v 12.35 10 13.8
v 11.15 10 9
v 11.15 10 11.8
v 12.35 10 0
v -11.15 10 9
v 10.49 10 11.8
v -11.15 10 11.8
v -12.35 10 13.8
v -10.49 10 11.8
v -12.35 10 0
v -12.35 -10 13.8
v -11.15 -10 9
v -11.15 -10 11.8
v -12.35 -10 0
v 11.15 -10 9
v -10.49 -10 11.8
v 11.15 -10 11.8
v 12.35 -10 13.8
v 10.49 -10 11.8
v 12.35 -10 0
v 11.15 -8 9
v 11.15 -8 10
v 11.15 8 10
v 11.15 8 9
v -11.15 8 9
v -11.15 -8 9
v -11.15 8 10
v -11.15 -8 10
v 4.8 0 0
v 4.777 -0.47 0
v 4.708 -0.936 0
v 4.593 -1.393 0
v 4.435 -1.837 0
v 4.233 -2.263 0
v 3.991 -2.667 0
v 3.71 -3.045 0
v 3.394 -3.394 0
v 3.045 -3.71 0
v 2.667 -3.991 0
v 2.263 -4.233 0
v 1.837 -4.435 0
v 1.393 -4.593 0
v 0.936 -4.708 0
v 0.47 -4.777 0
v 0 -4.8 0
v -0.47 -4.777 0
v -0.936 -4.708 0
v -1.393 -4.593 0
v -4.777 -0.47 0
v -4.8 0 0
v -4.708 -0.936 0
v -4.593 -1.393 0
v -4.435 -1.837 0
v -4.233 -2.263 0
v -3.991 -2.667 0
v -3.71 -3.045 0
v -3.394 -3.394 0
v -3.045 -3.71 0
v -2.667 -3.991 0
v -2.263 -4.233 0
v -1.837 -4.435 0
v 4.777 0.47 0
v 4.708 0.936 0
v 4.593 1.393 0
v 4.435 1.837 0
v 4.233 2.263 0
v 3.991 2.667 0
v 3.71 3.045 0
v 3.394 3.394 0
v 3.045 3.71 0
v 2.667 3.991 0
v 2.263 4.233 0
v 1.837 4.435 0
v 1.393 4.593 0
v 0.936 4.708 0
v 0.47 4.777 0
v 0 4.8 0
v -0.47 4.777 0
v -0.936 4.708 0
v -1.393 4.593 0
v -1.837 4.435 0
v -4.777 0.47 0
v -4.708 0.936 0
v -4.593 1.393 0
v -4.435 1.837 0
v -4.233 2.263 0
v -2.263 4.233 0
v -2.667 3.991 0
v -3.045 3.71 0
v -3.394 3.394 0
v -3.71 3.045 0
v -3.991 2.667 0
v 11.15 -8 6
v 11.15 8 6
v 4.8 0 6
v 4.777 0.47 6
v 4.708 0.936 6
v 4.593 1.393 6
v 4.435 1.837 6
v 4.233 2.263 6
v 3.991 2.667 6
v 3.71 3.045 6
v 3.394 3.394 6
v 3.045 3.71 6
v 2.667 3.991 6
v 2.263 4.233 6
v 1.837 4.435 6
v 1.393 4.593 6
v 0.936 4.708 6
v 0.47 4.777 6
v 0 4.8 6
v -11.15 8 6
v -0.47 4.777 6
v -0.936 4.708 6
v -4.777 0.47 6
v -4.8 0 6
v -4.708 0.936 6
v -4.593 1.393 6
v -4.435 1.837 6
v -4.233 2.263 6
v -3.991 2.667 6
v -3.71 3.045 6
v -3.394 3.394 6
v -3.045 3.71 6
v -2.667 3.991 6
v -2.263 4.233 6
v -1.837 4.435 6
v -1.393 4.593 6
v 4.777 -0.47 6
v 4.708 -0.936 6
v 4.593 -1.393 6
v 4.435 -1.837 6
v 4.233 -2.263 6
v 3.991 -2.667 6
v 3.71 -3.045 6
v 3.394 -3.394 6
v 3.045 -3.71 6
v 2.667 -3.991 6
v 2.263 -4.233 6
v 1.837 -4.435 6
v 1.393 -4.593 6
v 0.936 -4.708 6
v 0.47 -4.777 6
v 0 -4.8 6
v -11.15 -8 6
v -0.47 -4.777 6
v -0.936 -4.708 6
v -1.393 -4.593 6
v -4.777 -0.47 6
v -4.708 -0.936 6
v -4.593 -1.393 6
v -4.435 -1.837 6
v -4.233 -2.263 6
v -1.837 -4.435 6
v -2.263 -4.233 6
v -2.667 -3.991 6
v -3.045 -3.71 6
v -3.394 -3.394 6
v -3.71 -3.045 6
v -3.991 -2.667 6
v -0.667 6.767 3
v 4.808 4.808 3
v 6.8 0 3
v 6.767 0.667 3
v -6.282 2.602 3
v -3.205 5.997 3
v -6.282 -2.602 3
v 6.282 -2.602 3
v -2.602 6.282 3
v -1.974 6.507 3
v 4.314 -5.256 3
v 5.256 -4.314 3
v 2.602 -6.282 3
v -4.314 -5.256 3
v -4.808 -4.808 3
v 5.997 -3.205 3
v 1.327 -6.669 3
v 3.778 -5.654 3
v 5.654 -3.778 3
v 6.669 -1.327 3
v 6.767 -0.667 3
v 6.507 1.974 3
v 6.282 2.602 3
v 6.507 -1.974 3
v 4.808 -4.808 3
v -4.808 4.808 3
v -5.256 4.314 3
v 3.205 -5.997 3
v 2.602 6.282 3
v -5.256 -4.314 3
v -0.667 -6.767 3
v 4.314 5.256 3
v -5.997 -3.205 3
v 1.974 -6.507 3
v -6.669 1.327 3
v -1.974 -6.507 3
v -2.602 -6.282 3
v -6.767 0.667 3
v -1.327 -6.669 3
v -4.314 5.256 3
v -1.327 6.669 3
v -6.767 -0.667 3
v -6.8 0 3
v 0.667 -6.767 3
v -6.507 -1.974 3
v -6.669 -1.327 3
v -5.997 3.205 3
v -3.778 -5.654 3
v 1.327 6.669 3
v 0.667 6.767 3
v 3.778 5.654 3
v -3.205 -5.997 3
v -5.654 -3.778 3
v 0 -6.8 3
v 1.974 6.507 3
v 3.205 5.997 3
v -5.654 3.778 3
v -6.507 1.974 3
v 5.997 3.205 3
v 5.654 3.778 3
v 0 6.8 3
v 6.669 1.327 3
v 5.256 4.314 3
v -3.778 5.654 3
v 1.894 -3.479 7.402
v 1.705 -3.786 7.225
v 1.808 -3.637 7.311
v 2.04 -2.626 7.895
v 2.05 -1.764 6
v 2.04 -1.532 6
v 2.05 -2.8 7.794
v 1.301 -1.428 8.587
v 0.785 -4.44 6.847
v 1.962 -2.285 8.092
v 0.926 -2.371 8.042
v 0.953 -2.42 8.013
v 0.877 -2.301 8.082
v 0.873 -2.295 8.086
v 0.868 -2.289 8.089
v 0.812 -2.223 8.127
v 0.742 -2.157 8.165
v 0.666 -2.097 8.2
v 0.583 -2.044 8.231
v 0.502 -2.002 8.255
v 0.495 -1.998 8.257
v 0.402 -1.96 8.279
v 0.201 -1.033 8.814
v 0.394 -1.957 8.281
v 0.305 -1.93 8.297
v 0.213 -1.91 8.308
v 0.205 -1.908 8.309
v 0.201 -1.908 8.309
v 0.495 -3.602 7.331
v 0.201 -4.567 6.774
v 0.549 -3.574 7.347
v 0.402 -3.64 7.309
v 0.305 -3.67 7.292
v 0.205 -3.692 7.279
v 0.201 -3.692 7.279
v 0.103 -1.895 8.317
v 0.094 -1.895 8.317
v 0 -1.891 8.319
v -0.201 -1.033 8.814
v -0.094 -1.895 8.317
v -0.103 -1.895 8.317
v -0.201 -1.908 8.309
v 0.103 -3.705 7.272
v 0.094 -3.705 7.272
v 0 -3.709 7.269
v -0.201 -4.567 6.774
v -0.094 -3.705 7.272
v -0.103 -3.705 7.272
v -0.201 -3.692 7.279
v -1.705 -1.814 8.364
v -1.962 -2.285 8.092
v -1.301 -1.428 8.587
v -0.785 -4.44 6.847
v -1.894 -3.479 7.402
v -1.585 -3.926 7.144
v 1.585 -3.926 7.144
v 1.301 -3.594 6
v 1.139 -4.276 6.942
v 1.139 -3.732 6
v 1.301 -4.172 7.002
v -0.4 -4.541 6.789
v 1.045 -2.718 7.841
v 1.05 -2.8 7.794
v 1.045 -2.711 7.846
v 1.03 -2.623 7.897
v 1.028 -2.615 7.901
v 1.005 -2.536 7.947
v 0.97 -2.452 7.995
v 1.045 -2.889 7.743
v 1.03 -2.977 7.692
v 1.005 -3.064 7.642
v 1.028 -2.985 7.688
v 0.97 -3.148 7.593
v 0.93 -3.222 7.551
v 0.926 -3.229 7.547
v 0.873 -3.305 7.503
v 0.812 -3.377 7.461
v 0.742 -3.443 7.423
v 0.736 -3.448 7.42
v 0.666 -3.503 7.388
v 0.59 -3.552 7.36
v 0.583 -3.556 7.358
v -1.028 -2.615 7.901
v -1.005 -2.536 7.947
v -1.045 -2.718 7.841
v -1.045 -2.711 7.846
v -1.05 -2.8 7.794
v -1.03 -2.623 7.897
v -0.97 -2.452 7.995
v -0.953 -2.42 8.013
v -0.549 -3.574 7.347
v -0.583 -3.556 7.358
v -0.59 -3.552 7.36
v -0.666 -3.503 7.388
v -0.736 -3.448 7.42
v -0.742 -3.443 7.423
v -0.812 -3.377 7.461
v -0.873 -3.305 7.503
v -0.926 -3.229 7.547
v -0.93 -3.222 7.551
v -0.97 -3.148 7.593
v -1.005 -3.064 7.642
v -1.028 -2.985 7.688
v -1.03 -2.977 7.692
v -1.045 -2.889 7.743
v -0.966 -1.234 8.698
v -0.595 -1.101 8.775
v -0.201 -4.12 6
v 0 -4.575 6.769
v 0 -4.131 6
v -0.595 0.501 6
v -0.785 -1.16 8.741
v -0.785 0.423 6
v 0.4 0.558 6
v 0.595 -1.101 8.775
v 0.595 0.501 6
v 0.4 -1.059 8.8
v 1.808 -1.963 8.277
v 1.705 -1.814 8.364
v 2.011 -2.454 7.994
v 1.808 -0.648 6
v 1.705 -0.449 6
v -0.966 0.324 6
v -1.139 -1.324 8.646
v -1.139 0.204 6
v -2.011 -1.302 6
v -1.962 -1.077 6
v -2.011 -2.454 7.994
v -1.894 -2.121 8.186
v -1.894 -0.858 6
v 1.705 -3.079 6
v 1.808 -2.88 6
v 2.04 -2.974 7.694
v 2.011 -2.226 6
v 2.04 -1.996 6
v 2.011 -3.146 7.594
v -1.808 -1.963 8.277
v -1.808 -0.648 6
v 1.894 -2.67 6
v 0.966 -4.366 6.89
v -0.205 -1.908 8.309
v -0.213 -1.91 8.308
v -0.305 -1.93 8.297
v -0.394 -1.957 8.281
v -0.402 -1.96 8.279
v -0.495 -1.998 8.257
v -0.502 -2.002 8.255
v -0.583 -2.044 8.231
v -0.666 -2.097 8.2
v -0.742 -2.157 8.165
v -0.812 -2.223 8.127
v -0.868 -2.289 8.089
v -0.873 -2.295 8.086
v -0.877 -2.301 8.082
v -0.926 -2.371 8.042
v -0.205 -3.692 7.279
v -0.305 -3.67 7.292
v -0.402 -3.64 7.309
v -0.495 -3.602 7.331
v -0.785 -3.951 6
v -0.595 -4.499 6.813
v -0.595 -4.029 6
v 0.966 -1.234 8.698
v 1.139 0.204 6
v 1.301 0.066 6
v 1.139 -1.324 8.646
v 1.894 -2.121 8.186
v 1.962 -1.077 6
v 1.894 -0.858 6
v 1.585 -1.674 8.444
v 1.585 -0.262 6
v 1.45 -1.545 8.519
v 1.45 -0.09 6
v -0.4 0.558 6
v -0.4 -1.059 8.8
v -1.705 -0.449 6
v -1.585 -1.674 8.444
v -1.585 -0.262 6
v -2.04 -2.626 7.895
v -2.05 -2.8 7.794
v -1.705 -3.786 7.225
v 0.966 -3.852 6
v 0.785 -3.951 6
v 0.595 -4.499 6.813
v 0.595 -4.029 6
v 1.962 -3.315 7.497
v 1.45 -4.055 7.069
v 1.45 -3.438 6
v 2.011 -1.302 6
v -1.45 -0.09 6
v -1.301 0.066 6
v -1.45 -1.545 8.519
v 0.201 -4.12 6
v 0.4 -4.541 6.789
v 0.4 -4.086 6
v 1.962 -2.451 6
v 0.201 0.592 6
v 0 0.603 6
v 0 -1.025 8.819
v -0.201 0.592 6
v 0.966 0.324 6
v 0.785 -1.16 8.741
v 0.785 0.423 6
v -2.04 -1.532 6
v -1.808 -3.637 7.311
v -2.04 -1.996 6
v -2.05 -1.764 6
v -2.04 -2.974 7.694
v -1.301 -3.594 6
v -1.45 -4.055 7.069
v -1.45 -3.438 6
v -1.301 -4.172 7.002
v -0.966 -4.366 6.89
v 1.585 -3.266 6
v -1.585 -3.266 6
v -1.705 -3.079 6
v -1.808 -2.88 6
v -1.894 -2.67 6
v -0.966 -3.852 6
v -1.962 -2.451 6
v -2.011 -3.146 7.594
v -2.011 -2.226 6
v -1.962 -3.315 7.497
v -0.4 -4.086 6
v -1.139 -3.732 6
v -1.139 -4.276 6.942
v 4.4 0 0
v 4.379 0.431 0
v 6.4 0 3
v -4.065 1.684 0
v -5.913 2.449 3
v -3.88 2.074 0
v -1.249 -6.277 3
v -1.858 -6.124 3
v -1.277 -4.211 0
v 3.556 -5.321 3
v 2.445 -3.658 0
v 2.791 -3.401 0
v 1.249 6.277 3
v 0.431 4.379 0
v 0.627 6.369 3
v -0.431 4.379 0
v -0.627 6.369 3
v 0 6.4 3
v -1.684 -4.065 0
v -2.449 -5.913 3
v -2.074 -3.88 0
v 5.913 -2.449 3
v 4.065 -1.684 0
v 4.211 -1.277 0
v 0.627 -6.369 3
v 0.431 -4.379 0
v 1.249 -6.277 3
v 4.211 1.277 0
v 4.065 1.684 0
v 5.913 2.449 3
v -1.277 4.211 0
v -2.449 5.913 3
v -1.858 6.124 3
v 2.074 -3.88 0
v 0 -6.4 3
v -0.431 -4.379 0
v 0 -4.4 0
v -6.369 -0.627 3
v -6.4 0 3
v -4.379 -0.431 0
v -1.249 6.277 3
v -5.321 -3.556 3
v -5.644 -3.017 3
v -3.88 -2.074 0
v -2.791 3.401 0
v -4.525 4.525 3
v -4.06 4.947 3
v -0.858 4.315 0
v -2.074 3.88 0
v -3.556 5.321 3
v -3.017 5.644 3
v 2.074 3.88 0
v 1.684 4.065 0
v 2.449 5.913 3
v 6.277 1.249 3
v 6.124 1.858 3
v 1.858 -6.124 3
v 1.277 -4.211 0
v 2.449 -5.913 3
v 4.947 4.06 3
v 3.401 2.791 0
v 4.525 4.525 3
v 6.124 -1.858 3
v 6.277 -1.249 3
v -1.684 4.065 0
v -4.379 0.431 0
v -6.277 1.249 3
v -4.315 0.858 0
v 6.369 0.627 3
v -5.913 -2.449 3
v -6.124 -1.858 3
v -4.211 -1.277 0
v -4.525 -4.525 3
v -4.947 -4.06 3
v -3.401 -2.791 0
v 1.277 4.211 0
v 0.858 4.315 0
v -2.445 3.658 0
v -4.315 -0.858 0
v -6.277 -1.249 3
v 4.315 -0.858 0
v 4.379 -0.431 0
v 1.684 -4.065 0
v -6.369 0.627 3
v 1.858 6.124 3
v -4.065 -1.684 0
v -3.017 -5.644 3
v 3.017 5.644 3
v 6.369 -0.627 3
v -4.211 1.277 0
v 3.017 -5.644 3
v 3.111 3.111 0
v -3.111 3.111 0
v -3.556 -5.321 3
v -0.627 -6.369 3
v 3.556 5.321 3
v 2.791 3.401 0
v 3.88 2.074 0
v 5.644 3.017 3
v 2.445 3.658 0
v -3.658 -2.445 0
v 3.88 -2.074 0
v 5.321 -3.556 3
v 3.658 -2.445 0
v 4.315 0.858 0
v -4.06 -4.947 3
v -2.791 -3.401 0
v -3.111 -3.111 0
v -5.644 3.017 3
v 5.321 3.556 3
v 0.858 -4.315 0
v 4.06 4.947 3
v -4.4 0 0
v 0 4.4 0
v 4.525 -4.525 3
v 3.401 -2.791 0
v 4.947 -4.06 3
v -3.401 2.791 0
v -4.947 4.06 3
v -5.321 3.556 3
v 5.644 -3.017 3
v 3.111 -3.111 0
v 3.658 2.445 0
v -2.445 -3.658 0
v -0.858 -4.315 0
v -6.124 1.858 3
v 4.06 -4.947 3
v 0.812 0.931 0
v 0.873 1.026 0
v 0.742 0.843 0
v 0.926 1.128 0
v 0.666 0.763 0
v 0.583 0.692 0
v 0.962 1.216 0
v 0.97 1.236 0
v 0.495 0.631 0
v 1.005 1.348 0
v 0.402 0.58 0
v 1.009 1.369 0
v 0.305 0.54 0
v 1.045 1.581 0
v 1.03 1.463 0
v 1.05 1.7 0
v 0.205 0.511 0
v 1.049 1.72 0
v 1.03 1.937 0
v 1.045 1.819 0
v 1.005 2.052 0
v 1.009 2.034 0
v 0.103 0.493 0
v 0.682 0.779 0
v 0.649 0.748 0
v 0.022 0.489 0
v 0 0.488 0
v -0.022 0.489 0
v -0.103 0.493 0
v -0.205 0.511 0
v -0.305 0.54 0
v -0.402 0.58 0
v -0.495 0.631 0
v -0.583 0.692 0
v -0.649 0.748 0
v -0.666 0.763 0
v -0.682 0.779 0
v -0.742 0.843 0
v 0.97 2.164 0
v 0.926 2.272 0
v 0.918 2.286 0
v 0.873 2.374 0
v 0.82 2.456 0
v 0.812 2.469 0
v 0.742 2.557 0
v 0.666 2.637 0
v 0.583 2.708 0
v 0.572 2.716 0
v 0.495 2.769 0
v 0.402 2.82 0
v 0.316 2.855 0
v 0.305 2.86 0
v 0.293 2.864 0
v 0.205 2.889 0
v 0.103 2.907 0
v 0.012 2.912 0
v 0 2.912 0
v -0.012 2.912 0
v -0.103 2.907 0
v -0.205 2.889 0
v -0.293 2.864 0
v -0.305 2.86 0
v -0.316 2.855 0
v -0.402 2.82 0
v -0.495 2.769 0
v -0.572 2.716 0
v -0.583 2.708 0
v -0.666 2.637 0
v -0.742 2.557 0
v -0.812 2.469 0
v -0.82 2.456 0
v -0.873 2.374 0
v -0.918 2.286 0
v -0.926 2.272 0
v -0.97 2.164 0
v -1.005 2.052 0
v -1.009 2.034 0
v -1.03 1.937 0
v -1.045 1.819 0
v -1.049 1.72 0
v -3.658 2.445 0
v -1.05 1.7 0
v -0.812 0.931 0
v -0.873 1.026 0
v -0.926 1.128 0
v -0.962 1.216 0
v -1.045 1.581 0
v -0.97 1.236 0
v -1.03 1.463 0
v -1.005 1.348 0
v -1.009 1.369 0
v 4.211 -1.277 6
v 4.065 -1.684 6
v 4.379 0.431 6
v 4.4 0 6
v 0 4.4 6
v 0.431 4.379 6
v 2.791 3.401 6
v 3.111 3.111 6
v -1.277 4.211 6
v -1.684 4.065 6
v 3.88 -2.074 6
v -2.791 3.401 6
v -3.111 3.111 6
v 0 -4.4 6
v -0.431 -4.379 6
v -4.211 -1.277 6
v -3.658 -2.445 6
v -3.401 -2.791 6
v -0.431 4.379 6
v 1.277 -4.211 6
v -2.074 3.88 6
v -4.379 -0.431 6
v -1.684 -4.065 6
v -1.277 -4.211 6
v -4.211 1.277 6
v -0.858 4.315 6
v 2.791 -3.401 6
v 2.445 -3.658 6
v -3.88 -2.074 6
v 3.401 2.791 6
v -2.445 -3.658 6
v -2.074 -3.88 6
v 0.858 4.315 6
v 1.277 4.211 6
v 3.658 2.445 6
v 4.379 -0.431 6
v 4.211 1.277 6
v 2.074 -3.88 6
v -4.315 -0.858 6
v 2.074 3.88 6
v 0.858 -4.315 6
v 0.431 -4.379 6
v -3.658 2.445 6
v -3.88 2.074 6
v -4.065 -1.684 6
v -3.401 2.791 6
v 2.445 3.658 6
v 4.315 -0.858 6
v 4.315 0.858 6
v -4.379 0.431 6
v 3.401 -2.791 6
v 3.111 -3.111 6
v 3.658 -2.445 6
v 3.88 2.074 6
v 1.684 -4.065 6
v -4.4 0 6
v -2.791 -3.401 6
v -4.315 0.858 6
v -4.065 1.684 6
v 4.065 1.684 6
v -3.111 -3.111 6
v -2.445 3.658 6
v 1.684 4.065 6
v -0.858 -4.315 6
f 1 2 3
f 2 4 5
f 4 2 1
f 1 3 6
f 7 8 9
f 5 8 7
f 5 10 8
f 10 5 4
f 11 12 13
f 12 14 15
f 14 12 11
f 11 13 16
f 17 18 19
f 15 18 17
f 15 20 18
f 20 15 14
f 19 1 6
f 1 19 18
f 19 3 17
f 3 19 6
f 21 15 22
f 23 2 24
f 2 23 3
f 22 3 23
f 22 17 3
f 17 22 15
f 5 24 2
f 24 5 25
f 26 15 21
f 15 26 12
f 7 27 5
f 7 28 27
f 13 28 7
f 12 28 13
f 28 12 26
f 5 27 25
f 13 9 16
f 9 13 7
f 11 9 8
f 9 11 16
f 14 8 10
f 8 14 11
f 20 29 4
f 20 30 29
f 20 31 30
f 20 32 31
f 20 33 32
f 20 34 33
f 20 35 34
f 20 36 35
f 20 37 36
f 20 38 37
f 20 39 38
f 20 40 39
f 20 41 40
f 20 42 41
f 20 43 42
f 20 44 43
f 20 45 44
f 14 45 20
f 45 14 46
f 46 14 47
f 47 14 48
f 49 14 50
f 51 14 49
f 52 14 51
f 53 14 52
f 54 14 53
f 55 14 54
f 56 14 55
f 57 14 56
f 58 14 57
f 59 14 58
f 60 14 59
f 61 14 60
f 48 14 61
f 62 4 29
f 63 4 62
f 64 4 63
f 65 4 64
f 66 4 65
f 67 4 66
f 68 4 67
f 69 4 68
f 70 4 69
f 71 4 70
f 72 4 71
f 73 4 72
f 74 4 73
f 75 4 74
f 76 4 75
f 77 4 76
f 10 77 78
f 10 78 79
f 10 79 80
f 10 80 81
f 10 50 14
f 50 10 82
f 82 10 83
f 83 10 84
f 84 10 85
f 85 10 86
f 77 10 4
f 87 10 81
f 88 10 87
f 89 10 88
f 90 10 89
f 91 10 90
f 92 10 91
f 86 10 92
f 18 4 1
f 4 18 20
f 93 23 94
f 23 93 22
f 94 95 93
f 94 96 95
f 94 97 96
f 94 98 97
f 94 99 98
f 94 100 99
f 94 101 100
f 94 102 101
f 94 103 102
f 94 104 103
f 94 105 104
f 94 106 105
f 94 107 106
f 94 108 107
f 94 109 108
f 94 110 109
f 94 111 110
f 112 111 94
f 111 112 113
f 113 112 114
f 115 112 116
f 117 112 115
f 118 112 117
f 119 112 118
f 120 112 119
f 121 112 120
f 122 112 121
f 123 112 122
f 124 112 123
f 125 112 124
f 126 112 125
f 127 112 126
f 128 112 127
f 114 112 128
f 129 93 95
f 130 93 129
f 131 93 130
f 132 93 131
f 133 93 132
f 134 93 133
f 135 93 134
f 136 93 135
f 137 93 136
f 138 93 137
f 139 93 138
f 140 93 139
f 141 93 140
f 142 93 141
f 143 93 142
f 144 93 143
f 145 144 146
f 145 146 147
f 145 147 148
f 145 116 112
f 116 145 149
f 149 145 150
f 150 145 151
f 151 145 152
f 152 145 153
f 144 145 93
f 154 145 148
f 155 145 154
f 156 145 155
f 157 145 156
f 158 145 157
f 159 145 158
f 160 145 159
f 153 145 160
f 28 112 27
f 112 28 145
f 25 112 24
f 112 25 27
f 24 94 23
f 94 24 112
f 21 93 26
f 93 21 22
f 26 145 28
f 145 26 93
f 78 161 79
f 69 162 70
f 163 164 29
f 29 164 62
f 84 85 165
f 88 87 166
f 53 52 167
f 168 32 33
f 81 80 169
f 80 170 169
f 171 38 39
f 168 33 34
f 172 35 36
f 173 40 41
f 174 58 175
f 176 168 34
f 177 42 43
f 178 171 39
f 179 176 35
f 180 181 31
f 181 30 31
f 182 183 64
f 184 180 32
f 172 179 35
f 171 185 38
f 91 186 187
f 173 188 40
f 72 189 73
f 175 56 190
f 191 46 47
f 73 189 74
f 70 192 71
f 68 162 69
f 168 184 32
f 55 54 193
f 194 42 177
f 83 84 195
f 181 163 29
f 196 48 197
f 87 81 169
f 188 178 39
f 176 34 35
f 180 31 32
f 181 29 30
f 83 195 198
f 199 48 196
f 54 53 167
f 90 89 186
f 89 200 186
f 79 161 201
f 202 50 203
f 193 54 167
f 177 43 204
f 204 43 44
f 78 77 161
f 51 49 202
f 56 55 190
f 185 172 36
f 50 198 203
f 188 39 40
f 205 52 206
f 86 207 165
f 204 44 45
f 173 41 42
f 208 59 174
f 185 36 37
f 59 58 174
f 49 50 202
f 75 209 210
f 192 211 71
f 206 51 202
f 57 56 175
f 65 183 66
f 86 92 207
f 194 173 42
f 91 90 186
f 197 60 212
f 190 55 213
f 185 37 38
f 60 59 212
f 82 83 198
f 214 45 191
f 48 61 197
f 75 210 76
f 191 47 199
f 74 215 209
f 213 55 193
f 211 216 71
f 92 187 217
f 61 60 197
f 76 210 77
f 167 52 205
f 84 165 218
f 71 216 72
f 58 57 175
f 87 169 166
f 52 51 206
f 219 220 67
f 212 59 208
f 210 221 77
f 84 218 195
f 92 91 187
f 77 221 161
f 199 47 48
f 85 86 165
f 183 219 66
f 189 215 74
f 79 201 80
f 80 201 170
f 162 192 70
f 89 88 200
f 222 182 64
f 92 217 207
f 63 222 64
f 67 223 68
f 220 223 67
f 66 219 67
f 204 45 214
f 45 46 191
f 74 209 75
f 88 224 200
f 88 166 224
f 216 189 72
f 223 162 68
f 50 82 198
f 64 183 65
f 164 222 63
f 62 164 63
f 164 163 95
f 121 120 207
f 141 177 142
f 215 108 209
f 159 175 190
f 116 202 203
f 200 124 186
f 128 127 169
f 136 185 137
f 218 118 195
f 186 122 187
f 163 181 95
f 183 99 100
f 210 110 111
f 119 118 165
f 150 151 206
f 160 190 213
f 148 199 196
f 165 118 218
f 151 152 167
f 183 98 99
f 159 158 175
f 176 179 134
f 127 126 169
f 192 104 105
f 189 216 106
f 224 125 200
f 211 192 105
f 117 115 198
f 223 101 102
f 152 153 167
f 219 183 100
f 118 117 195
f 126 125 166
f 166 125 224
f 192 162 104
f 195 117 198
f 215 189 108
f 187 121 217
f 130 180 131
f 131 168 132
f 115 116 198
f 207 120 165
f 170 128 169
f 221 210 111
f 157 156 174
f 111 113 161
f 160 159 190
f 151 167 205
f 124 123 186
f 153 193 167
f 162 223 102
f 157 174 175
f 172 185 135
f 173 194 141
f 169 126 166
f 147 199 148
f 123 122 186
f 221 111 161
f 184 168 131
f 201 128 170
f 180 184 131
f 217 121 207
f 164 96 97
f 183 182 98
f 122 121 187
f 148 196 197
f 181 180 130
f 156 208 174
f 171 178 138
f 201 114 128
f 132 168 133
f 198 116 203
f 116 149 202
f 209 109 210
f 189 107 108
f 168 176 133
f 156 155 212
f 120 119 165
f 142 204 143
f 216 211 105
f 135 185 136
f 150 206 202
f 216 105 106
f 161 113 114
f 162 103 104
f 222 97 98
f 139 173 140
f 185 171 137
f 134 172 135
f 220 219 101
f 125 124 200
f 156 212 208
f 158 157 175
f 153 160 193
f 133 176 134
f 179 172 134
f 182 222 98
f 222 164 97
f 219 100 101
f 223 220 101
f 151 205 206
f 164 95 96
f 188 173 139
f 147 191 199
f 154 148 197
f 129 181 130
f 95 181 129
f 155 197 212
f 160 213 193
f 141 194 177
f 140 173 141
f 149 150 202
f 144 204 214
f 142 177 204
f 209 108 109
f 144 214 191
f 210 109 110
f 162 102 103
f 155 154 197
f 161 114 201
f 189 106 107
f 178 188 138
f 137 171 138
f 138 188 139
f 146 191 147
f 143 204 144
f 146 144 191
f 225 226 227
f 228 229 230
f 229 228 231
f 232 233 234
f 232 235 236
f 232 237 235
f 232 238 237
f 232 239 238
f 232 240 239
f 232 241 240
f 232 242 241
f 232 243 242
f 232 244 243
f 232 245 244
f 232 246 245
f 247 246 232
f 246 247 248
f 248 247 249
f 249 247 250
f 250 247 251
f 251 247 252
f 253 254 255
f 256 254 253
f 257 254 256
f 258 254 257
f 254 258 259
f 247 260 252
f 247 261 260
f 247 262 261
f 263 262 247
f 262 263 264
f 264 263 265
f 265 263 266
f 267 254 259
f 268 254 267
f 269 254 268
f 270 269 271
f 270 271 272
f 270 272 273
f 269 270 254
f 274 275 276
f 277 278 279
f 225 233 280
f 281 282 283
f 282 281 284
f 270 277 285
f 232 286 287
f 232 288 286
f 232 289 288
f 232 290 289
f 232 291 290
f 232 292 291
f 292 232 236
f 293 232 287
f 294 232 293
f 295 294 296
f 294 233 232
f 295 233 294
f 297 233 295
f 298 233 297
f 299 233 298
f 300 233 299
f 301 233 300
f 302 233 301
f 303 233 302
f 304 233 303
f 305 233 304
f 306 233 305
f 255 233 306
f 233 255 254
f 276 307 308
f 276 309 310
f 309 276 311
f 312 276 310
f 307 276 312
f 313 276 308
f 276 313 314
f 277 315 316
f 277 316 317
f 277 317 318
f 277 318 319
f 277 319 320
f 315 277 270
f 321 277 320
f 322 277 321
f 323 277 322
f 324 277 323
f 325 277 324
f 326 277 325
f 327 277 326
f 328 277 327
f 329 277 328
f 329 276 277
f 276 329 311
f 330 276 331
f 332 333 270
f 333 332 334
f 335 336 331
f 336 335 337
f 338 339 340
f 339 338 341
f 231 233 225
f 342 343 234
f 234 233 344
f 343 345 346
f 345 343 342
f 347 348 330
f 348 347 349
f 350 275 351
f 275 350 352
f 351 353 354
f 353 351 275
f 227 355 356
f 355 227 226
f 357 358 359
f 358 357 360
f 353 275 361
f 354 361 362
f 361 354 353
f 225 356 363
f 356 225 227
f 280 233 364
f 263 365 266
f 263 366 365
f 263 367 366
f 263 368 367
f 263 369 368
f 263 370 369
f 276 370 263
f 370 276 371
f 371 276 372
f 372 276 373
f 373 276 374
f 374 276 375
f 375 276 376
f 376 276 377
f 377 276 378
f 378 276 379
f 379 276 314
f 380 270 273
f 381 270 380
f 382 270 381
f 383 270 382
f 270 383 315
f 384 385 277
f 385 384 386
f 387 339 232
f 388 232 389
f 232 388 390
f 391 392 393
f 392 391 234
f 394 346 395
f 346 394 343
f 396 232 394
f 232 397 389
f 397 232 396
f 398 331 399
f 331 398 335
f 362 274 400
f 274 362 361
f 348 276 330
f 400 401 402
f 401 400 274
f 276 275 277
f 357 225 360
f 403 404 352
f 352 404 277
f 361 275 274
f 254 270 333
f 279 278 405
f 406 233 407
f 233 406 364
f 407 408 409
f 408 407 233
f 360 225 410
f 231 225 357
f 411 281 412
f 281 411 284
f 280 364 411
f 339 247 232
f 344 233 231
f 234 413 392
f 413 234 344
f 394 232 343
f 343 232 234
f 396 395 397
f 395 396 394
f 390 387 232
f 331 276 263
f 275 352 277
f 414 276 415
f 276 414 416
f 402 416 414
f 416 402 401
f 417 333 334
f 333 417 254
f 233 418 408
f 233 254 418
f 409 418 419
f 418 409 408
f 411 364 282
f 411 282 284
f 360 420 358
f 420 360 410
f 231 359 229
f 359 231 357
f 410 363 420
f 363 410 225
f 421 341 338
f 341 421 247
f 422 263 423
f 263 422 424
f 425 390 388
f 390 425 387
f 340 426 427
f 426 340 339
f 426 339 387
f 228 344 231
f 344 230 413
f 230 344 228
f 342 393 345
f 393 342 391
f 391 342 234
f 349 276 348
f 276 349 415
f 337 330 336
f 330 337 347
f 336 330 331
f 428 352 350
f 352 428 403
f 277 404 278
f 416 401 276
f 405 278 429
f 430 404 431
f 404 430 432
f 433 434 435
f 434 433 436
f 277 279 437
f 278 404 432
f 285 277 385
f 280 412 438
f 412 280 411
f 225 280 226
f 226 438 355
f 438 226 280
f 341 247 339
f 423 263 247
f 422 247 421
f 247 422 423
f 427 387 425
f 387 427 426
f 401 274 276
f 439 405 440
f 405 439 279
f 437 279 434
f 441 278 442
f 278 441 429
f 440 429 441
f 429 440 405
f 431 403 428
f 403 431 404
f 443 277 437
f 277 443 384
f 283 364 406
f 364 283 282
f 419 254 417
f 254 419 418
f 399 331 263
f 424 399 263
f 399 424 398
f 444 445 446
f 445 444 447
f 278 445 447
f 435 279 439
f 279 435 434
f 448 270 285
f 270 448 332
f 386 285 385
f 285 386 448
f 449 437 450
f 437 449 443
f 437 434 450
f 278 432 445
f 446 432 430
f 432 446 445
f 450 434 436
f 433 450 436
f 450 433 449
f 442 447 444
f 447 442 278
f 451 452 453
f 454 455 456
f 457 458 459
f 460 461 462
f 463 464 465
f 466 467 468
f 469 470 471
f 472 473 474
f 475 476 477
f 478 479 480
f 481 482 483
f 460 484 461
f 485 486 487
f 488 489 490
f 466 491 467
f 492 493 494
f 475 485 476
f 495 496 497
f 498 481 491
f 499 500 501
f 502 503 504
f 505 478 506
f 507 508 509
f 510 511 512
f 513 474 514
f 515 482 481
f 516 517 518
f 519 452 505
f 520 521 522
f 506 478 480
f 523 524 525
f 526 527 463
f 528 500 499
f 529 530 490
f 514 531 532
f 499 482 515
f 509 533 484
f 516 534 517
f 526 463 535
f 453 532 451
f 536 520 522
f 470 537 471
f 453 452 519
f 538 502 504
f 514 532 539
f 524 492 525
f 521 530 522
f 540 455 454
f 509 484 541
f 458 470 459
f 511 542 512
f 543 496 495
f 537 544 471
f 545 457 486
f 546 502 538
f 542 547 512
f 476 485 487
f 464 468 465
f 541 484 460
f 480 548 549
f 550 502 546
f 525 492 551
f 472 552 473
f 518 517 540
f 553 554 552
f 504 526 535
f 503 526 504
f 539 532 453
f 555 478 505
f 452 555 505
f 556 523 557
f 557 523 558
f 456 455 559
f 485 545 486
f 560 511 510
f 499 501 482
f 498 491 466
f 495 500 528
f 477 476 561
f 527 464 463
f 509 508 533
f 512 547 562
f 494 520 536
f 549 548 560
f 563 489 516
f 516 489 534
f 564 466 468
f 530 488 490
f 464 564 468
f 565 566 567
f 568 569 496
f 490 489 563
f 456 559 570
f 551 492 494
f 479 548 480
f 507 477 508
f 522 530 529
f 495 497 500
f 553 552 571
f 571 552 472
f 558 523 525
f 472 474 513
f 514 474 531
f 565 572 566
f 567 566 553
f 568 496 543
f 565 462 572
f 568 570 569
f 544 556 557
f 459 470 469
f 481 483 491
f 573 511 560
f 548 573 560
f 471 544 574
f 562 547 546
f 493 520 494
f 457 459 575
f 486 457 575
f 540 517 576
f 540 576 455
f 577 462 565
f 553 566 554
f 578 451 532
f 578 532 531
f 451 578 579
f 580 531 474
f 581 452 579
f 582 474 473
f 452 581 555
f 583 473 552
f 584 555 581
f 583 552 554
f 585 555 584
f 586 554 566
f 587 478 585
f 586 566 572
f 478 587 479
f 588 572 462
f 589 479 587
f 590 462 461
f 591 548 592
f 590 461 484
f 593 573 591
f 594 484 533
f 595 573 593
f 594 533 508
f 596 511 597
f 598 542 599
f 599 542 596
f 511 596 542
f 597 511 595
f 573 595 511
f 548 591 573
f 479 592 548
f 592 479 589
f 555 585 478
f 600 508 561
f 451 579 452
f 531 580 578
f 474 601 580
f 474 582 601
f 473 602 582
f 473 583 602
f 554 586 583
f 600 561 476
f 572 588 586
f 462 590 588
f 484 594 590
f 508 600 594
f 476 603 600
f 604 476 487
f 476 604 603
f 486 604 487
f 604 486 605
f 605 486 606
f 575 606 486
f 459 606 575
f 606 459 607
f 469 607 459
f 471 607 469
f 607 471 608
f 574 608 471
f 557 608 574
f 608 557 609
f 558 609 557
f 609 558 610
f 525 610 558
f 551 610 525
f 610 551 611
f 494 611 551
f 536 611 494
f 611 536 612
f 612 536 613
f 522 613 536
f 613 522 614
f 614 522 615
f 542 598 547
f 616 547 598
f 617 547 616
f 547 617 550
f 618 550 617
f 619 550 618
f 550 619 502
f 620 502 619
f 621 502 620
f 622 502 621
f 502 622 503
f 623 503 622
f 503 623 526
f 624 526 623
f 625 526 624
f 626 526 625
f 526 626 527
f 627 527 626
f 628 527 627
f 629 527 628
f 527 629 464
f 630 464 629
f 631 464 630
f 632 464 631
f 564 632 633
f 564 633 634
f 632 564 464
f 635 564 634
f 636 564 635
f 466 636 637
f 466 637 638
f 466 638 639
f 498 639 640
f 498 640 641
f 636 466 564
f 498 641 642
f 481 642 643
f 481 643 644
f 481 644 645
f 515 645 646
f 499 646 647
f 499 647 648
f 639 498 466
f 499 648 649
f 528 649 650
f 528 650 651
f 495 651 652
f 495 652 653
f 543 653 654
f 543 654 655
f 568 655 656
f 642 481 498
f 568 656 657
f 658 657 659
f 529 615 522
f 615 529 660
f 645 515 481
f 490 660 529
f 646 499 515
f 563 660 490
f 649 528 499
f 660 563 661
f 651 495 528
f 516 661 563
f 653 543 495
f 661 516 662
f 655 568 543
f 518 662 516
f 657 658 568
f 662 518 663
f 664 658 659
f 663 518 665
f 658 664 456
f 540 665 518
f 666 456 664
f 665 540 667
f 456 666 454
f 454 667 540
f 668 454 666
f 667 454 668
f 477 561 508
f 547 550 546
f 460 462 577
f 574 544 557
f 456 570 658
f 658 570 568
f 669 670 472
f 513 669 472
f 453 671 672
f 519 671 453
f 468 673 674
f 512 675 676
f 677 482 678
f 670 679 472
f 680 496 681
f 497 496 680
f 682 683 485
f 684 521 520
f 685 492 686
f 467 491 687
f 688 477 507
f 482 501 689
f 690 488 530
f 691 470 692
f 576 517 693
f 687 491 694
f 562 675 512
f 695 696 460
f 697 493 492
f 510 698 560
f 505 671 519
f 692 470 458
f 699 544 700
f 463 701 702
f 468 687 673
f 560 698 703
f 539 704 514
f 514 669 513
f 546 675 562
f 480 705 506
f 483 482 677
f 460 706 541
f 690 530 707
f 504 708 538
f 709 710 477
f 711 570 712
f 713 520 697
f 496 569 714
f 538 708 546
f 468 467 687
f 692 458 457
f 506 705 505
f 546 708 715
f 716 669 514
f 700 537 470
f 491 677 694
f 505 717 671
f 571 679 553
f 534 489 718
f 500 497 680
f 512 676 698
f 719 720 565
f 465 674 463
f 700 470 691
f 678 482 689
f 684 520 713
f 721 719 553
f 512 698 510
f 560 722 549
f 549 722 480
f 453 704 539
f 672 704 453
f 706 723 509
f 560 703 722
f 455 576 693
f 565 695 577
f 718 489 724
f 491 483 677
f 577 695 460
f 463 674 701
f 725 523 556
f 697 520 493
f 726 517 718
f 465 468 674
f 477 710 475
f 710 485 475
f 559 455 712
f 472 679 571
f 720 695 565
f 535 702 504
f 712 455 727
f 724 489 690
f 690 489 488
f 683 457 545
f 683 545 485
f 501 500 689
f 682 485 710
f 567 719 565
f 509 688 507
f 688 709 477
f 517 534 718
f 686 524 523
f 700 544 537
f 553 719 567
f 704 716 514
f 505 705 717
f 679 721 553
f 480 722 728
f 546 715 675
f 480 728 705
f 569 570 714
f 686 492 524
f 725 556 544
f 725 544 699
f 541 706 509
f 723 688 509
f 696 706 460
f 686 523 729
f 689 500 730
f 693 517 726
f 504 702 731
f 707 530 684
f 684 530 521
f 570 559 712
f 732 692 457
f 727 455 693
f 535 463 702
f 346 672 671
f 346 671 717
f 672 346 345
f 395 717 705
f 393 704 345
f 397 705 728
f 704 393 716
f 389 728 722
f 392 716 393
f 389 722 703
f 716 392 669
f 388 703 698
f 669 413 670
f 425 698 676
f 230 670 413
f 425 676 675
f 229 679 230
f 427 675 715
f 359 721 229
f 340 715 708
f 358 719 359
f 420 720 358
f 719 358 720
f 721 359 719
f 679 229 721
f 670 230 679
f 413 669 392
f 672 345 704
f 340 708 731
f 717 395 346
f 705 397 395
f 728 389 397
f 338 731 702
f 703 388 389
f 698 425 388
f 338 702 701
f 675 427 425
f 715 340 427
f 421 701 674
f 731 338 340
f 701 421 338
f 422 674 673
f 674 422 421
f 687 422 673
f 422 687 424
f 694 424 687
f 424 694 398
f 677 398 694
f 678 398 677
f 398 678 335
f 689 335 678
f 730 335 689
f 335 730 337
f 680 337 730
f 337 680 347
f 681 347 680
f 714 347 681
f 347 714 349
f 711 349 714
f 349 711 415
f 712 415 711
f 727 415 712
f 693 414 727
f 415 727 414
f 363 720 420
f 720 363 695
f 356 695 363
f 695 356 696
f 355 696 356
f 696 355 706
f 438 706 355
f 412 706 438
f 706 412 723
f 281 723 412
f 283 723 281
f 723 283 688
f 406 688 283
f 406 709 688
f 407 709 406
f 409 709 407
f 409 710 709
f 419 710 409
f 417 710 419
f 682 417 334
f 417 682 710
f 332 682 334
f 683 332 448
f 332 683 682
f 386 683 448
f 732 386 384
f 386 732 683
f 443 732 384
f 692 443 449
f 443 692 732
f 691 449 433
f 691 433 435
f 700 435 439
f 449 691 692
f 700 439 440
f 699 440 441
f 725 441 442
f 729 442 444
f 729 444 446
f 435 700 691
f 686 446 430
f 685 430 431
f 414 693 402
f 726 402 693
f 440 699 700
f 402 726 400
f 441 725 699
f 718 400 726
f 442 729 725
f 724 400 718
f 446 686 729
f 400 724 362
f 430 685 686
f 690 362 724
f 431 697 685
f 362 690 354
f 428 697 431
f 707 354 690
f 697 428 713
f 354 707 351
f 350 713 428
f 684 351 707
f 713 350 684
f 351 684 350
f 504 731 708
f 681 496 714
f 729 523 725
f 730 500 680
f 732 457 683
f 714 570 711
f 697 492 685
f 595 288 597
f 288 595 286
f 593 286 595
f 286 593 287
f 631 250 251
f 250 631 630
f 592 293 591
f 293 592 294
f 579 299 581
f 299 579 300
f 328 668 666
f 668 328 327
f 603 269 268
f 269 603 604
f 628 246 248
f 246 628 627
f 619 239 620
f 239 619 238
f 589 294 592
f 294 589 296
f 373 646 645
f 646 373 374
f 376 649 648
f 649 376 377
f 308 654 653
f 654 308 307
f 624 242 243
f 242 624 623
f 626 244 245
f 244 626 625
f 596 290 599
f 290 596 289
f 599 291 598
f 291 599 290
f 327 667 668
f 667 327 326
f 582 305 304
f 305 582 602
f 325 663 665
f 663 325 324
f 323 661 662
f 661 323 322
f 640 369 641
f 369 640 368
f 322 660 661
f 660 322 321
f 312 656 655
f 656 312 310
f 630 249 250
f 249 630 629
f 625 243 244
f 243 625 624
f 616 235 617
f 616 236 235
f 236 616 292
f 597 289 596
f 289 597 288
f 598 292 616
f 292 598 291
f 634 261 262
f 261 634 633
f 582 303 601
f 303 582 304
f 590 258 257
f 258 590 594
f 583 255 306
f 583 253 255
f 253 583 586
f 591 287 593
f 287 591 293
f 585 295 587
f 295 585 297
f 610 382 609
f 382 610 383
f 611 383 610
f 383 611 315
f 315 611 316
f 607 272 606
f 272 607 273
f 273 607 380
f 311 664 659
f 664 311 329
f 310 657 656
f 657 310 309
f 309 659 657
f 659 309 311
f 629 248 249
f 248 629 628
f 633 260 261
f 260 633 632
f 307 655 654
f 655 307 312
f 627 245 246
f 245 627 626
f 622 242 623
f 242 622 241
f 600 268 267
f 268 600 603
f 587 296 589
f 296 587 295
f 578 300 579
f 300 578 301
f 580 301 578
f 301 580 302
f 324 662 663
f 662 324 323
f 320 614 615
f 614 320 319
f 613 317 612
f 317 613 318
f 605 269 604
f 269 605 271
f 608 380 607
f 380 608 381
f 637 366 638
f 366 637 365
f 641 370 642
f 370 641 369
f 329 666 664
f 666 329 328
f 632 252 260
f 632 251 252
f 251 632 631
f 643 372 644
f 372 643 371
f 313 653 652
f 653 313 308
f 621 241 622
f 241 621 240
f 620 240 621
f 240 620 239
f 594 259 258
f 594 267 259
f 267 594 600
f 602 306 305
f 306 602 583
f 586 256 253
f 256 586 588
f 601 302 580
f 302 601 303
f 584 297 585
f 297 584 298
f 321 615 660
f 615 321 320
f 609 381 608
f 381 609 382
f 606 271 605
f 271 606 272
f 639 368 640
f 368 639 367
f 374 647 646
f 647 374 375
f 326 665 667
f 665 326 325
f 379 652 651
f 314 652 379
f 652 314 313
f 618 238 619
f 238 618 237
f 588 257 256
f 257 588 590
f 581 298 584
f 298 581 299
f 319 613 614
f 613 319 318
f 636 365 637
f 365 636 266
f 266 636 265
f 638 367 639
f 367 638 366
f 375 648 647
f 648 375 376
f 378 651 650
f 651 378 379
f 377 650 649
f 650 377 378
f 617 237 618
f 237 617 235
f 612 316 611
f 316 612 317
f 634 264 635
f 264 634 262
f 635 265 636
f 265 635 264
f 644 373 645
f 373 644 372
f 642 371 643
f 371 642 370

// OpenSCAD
// file: ../utils.scad
module pillinder(width, radius, height) {
  hull() {
    translate([width/2 - radius, 0, 0])
    cylinder(h=height, r=radius, $fn=64);
    translate([-width/2 + radius, 0, 0])
    cylinder(h=height, r=radius, $fn=64);
  }
}
// main file
include <../utils.scad>

$fn=64;
width = 20;
channel_width = 22.3;
latch_height = 2;
overhang = 0.66;
wall_thickness = 2.8;
box_thickness = 9;
bottom_thickness = 2;
bottom_hole_d = 9.6;
bottom_hole_width = 20;

lip = 2;
inner_d = bottom_hole_d + 2*lip;
inner_thickness = 6;

outer_x = channel_width/2 + 1.2;

nail_angle = 30;
nail_d = 2.1;
sheath_wall = 1;
sheath_y = 1.7;

kerf = 0.4;

main();
nail_sheath();

module nail_sheath() {
difference() {
    union() {
        translate([0,sheath_y,0])
        rotate([nail_angle, 0, 0])
        translate([0,0,-2])
        cylinder(h=box_thickness+2, d=nail_d+2*sheath_wall);
        
        cylinder(h=inner_thickness/2, d1=bottom_hole_d-2*kerf, d2=inner_d-2*kerf);
        translate([0,0,inner_thickness/2])
        cylinder(h=inner_thickness/2, d2=bottom_hole_d-2*kerf, d1=inner_d-2*kerf);
    }
    
    translate([0,sheath_y,0])
    rotate([nail_angle, 0, 0])
    translate([0,0,-2])
    cylinder(h=box_thickness+3, d=nail_d);
    
    translate([0,0,-5])
    cube([10,10,10], center=true);
}
}


module main() {
difference() {
  translate([0,0,box_thickness])
  rotate([90,0,0])
  translate([0, 0, -width/2])
  linear_extrude(width)
  polygon([
    [-outer_x, -box_thickness],
    [-outer_x, wall_thickness + latch_height],
    [-channel_width/2 + overhang, wall_thickness],
    [-channel_width/2, wall_thickness],
    [-channel_width/2, 0],
    [channel_width/2, 0],
    [channel_width/2, wall_thickness],
    [channel_width/2 - overhang, wall_thickness],
    [outer_x, wall_thickness + latch_height],
    [outer_x, -box_thickness],
  ]);
    
  z_dim = box_thickness - inner_thickness+1;
  translate([0, 0, inner_thickness + z_dim/2])
  cube([channel_width, width - 4, z_dim], center=true);


  //cylinder(h=1, d=bottom_hole_d+0.2);
  cylinder(h=inner_thickness/2, d1=bottom_hole_d, d2=inner_d);
  translate([0,0,inner_thickness/2])
  cylinder(h=inner_thickness/2, d2=bottom_hole_d, d1=inner_d);
}
}
